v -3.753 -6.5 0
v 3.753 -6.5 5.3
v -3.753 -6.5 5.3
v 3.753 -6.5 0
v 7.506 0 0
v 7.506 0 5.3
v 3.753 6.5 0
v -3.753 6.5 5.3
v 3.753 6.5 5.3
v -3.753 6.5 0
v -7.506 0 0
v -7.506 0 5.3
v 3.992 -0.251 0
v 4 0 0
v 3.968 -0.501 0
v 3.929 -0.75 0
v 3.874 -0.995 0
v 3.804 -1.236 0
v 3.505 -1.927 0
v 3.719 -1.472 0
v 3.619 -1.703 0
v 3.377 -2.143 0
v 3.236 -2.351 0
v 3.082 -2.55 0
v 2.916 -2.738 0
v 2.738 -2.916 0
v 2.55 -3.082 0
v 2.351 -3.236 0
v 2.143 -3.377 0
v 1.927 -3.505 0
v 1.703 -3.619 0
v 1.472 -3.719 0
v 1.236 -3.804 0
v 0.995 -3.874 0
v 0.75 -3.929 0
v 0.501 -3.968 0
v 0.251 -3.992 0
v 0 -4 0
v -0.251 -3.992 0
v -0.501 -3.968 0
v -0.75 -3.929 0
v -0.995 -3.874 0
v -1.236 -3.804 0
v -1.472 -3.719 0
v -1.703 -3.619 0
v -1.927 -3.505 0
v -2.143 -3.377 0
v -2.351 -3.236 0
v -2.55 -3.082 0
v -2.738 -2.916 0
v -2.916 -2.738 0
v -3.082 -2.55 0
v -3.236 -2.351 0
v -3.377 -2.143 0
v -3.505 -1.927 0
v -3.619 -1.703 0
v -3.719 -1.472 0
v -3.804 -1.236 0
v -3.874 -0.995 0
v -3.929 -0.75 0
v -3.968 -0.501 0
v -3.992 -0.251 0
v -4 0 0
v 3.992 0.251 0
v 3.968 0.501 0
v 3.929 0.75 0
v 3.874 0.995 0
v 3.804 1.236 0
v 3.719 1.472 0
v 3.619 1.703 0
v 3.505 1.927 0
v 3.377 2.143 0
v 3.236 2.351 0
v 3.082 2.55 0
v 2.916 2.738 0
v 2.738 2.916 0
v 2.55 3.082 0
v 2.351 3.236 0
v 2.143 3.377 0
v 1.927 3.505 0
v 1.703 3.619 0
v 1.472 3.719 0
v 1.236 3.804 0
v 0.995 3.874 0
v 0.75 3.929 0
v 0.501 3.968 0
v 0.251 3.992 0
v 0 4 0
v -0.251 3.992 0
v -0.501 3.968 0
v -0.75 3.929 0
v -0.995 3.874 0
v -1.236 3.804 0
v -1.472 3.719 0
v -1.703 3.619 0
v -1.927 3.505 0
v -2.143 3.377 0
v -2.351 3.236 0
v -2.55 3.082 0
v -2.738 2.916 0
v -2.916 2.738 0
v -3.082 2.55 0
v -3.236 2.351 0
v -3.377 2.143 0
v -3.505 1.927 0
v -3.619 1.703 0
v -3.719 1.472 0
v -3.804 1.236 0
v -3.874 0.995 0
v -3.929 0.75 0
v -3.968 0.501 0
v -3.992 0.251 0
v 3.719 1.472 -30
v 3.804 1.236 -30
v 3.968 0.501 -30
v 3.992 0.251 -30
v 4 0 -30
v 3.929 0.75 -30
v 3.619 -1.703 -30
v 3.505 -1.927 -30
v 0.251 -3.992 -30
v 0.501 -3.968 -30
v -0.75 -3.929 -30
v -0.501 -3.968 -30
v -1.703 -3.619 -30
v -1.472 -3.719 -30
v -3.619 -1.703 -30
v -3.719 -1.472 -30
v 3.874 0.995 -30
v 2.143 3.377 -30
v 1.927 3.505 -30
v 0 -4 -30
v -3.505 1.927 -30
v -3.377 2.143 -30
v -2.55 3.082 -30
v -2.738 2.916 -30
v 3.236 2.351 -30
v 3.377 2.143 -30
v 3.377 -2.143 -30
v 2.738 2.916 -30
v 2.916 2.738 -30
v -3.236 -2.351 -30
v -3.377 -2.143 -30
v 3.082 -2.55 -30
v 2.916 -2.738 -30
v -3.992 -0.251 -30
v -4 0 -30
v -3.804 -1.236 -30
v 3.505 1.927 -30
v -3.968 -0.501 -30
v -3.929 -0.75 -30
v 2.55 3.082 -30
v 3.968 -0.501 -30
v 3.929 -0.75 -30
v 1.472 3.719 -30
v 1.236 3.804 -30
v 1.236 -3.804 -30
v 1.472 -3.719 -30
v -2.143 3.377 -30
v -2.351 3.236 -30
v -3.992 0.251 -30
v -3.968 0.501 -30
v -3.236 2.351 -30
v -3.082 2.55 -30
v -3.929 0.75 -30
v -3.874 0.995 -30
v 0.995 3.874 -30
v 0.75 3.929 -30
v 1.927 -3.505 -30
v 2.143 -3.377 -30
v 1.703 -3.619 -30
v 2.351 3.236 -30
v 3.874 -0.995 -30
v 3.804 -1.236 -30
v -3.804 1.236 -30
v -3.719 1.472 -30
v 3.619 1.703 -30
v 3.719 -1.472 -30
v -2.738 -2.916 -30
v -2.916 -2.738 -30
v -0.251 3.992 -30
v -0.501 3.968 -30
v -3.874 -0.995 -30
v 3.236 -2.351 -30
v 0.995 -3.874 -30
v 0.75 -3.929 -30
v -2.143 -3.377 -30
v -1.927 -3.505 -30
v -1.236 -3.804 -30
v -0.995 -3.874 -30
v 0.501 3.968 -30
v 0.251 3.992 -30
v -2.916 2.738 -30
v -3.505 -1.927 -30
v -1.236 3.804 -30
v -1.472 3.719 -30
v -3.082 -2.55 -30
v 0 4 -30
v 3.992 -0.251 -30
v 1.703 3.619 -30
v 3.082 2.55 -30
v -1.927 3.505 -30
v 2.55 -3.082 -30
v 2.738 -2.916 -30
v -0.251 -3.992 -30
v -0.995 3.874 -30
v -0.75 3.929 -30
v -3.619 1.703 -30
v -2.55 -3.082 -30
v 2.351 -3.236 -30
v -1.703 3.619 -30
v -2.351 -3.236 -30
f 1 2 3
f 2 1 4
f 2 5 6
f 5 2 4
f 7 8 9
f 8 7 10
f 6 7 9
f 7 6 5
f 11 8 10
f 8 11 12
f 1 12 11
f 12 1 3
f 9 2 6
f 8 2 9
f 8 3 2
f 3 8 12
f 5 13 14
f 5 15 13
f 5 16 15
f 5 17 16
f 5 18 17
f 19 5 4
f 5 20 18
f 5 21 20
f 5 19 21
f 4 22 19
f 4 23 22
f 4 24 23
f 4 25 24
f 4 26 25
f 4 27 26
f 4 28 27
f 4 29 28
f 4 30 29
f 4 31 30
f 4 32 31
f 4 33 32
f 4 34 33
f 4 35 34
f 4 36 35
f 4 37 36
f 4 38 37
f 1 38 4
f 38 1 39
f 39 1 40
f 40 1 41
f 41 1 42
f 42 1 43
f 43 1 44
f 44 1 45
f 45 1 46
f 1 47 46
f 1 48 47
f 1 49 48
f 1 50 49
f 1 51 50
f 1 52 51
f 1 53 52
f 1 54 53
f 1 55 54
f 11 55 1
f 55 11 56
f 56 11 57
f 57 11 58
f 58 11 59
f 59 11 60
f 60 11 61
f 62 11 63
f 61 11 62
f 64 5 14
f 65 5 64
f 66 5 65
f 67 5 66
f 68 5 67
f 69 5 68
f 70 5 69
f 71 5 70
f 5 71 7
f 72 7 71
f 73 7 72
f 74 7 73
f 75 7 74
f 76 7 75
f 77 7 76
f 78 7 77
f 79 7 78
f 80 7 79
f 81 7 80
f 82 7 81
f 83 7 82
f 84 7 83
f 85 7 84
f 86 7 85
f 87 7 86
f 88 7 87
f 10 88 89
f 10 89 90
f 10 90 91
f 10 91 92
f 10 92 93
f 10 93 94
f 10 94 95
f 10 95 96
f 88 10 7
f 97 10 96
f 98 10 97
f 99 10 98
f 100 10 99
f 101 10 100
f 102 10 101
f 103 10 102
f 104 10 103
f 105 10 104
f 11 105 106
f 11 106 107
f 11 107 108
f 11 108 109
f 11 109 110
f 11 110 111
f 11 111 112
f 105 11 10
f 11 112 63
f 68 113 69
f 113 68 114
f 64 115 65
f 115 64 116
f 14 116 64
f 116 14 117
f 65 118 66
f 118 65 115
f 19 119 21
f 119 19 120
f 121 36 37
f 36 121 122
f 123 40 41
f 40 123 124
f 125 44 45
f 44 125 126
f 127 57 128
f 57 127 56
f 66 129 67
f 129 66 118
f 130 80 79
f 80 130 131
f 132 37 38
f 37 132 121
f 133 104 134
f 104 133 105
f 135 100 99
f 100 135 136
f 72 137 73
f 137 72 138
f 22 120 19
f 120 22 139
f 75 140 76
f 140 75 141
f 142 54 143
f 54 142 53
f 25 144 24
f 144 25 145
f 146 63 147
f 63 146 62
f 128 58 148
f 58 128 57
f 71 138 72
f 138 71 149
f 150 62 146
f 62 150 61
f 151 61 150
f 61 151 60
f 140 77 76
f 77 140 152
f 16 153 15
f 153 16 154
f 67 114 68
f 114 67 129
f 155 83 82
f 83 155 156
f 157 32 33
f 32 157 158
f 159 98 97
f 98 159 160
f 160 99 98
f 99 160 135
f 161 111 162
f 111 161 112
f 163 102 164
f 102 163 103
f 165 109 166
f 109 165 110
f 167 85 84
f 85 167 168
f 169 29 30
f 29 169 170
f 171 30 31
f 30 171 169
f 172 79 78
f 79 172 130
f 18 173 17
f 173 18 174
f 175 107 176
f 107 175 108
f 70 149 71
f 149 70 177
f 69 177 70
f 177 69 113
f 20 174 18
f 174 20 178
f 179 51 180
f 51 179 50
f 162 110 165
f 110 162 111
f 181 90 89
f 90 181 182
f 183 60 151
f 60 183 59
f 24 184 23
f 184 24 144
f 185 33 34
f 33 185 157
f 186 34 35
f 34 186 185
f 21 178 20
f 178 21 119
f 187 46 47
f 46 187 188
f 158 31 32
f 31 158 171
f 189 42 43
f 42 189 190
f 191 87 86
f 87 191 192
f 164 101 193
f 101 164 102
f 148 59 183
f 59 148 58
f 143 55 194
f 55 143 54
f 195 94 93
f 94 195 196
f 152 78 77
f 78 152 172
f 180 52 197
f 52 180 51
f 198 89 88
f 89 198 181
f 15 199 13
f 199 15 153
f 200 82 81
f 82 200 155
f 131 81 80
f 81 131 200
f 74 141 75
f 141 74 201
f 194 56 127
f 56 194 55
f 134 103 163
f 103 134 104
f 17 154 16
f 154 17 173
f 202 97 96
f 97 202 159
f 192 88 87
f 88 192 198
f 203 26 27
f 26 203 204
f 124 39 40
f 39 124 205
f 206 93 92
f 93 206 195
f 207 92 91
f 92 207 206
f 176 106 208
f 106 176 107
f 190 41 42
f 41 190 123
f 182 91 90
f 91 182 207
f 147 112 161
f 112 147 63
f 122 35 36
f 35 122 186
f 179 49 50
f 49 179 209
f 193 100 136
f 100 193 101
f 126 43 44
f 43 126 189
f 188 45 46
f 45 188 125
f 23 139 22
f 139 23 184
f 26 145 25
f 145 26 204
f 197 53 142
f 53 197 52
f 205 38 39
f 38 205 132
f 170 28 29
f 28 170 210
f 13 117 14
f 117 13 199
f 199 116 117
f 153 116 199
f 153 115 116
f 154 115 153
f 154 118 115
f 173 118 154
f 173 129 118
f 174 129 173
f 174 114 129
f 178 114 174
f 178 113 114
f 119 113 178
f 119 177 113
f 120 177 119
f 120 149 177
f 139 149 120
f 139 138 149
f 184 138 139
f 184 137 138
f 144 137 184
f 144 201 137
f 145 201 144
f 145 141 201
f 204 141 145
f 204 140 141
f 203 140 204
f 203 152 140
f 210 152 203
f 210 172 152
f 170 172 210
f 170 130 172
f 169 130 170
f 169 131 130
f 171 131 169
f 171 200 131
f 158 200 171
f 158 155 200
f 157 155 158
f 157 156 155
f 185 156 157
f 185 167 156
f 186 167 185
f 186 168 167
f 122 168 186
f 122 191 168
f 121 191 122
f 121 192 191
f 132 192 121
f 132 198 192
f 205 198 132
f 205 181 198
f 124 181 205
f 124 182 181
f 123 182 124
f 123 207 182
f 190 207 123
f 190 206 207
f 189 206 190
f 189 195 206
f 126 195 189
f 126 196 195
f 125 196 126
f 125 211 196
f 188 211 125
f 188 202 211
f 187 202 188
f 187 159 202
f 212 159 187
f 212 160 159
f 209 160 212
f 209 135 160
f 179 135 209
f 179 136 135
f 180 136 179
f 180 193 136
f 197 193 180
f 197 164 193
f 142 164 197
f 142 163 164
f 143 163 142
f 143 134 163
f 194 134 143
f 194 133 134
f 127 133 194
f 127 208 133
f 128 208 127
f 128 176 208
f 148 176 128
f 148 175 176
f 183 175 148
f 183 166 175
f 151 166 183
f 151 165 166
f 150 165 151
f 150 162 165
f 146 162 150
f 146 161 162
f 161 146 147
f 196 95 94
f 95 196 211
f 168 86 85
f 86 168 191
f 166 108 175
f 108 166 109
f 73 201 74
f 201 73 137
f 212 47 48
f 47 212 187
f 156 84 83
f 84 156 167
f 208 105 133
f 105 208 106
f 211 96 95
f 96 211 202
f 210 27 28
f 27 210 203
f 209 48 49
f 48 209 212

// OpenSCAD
// M8 hex bolt (simplified, no threads)

// Parameters
across_flats = 13;      // 対辺距離 (mm)
head_height  = 5.3;     // 頭部高さ (mm)
shank_dia    = 8;       // シャンク直径 (mm)
shank_len    = 30;      // シャンク長さ (mm)

$fn = 100;

module hex_bolt() {
    // 頭部: 六角柱 (底面 z=0, 上面 z=head_height)
    // 対辺距離から外接円半径を計算
    r_head = across_flats / sqrt(3);
    cylinder(h = head_height, r = r_head, $fn = 6);

    // シャンク: z<0 側へ伸ばす
    translate([0, 0, -shank_len])
        cylinder(h = shank_len, d = shank_dia);
}

hex_bolt();
